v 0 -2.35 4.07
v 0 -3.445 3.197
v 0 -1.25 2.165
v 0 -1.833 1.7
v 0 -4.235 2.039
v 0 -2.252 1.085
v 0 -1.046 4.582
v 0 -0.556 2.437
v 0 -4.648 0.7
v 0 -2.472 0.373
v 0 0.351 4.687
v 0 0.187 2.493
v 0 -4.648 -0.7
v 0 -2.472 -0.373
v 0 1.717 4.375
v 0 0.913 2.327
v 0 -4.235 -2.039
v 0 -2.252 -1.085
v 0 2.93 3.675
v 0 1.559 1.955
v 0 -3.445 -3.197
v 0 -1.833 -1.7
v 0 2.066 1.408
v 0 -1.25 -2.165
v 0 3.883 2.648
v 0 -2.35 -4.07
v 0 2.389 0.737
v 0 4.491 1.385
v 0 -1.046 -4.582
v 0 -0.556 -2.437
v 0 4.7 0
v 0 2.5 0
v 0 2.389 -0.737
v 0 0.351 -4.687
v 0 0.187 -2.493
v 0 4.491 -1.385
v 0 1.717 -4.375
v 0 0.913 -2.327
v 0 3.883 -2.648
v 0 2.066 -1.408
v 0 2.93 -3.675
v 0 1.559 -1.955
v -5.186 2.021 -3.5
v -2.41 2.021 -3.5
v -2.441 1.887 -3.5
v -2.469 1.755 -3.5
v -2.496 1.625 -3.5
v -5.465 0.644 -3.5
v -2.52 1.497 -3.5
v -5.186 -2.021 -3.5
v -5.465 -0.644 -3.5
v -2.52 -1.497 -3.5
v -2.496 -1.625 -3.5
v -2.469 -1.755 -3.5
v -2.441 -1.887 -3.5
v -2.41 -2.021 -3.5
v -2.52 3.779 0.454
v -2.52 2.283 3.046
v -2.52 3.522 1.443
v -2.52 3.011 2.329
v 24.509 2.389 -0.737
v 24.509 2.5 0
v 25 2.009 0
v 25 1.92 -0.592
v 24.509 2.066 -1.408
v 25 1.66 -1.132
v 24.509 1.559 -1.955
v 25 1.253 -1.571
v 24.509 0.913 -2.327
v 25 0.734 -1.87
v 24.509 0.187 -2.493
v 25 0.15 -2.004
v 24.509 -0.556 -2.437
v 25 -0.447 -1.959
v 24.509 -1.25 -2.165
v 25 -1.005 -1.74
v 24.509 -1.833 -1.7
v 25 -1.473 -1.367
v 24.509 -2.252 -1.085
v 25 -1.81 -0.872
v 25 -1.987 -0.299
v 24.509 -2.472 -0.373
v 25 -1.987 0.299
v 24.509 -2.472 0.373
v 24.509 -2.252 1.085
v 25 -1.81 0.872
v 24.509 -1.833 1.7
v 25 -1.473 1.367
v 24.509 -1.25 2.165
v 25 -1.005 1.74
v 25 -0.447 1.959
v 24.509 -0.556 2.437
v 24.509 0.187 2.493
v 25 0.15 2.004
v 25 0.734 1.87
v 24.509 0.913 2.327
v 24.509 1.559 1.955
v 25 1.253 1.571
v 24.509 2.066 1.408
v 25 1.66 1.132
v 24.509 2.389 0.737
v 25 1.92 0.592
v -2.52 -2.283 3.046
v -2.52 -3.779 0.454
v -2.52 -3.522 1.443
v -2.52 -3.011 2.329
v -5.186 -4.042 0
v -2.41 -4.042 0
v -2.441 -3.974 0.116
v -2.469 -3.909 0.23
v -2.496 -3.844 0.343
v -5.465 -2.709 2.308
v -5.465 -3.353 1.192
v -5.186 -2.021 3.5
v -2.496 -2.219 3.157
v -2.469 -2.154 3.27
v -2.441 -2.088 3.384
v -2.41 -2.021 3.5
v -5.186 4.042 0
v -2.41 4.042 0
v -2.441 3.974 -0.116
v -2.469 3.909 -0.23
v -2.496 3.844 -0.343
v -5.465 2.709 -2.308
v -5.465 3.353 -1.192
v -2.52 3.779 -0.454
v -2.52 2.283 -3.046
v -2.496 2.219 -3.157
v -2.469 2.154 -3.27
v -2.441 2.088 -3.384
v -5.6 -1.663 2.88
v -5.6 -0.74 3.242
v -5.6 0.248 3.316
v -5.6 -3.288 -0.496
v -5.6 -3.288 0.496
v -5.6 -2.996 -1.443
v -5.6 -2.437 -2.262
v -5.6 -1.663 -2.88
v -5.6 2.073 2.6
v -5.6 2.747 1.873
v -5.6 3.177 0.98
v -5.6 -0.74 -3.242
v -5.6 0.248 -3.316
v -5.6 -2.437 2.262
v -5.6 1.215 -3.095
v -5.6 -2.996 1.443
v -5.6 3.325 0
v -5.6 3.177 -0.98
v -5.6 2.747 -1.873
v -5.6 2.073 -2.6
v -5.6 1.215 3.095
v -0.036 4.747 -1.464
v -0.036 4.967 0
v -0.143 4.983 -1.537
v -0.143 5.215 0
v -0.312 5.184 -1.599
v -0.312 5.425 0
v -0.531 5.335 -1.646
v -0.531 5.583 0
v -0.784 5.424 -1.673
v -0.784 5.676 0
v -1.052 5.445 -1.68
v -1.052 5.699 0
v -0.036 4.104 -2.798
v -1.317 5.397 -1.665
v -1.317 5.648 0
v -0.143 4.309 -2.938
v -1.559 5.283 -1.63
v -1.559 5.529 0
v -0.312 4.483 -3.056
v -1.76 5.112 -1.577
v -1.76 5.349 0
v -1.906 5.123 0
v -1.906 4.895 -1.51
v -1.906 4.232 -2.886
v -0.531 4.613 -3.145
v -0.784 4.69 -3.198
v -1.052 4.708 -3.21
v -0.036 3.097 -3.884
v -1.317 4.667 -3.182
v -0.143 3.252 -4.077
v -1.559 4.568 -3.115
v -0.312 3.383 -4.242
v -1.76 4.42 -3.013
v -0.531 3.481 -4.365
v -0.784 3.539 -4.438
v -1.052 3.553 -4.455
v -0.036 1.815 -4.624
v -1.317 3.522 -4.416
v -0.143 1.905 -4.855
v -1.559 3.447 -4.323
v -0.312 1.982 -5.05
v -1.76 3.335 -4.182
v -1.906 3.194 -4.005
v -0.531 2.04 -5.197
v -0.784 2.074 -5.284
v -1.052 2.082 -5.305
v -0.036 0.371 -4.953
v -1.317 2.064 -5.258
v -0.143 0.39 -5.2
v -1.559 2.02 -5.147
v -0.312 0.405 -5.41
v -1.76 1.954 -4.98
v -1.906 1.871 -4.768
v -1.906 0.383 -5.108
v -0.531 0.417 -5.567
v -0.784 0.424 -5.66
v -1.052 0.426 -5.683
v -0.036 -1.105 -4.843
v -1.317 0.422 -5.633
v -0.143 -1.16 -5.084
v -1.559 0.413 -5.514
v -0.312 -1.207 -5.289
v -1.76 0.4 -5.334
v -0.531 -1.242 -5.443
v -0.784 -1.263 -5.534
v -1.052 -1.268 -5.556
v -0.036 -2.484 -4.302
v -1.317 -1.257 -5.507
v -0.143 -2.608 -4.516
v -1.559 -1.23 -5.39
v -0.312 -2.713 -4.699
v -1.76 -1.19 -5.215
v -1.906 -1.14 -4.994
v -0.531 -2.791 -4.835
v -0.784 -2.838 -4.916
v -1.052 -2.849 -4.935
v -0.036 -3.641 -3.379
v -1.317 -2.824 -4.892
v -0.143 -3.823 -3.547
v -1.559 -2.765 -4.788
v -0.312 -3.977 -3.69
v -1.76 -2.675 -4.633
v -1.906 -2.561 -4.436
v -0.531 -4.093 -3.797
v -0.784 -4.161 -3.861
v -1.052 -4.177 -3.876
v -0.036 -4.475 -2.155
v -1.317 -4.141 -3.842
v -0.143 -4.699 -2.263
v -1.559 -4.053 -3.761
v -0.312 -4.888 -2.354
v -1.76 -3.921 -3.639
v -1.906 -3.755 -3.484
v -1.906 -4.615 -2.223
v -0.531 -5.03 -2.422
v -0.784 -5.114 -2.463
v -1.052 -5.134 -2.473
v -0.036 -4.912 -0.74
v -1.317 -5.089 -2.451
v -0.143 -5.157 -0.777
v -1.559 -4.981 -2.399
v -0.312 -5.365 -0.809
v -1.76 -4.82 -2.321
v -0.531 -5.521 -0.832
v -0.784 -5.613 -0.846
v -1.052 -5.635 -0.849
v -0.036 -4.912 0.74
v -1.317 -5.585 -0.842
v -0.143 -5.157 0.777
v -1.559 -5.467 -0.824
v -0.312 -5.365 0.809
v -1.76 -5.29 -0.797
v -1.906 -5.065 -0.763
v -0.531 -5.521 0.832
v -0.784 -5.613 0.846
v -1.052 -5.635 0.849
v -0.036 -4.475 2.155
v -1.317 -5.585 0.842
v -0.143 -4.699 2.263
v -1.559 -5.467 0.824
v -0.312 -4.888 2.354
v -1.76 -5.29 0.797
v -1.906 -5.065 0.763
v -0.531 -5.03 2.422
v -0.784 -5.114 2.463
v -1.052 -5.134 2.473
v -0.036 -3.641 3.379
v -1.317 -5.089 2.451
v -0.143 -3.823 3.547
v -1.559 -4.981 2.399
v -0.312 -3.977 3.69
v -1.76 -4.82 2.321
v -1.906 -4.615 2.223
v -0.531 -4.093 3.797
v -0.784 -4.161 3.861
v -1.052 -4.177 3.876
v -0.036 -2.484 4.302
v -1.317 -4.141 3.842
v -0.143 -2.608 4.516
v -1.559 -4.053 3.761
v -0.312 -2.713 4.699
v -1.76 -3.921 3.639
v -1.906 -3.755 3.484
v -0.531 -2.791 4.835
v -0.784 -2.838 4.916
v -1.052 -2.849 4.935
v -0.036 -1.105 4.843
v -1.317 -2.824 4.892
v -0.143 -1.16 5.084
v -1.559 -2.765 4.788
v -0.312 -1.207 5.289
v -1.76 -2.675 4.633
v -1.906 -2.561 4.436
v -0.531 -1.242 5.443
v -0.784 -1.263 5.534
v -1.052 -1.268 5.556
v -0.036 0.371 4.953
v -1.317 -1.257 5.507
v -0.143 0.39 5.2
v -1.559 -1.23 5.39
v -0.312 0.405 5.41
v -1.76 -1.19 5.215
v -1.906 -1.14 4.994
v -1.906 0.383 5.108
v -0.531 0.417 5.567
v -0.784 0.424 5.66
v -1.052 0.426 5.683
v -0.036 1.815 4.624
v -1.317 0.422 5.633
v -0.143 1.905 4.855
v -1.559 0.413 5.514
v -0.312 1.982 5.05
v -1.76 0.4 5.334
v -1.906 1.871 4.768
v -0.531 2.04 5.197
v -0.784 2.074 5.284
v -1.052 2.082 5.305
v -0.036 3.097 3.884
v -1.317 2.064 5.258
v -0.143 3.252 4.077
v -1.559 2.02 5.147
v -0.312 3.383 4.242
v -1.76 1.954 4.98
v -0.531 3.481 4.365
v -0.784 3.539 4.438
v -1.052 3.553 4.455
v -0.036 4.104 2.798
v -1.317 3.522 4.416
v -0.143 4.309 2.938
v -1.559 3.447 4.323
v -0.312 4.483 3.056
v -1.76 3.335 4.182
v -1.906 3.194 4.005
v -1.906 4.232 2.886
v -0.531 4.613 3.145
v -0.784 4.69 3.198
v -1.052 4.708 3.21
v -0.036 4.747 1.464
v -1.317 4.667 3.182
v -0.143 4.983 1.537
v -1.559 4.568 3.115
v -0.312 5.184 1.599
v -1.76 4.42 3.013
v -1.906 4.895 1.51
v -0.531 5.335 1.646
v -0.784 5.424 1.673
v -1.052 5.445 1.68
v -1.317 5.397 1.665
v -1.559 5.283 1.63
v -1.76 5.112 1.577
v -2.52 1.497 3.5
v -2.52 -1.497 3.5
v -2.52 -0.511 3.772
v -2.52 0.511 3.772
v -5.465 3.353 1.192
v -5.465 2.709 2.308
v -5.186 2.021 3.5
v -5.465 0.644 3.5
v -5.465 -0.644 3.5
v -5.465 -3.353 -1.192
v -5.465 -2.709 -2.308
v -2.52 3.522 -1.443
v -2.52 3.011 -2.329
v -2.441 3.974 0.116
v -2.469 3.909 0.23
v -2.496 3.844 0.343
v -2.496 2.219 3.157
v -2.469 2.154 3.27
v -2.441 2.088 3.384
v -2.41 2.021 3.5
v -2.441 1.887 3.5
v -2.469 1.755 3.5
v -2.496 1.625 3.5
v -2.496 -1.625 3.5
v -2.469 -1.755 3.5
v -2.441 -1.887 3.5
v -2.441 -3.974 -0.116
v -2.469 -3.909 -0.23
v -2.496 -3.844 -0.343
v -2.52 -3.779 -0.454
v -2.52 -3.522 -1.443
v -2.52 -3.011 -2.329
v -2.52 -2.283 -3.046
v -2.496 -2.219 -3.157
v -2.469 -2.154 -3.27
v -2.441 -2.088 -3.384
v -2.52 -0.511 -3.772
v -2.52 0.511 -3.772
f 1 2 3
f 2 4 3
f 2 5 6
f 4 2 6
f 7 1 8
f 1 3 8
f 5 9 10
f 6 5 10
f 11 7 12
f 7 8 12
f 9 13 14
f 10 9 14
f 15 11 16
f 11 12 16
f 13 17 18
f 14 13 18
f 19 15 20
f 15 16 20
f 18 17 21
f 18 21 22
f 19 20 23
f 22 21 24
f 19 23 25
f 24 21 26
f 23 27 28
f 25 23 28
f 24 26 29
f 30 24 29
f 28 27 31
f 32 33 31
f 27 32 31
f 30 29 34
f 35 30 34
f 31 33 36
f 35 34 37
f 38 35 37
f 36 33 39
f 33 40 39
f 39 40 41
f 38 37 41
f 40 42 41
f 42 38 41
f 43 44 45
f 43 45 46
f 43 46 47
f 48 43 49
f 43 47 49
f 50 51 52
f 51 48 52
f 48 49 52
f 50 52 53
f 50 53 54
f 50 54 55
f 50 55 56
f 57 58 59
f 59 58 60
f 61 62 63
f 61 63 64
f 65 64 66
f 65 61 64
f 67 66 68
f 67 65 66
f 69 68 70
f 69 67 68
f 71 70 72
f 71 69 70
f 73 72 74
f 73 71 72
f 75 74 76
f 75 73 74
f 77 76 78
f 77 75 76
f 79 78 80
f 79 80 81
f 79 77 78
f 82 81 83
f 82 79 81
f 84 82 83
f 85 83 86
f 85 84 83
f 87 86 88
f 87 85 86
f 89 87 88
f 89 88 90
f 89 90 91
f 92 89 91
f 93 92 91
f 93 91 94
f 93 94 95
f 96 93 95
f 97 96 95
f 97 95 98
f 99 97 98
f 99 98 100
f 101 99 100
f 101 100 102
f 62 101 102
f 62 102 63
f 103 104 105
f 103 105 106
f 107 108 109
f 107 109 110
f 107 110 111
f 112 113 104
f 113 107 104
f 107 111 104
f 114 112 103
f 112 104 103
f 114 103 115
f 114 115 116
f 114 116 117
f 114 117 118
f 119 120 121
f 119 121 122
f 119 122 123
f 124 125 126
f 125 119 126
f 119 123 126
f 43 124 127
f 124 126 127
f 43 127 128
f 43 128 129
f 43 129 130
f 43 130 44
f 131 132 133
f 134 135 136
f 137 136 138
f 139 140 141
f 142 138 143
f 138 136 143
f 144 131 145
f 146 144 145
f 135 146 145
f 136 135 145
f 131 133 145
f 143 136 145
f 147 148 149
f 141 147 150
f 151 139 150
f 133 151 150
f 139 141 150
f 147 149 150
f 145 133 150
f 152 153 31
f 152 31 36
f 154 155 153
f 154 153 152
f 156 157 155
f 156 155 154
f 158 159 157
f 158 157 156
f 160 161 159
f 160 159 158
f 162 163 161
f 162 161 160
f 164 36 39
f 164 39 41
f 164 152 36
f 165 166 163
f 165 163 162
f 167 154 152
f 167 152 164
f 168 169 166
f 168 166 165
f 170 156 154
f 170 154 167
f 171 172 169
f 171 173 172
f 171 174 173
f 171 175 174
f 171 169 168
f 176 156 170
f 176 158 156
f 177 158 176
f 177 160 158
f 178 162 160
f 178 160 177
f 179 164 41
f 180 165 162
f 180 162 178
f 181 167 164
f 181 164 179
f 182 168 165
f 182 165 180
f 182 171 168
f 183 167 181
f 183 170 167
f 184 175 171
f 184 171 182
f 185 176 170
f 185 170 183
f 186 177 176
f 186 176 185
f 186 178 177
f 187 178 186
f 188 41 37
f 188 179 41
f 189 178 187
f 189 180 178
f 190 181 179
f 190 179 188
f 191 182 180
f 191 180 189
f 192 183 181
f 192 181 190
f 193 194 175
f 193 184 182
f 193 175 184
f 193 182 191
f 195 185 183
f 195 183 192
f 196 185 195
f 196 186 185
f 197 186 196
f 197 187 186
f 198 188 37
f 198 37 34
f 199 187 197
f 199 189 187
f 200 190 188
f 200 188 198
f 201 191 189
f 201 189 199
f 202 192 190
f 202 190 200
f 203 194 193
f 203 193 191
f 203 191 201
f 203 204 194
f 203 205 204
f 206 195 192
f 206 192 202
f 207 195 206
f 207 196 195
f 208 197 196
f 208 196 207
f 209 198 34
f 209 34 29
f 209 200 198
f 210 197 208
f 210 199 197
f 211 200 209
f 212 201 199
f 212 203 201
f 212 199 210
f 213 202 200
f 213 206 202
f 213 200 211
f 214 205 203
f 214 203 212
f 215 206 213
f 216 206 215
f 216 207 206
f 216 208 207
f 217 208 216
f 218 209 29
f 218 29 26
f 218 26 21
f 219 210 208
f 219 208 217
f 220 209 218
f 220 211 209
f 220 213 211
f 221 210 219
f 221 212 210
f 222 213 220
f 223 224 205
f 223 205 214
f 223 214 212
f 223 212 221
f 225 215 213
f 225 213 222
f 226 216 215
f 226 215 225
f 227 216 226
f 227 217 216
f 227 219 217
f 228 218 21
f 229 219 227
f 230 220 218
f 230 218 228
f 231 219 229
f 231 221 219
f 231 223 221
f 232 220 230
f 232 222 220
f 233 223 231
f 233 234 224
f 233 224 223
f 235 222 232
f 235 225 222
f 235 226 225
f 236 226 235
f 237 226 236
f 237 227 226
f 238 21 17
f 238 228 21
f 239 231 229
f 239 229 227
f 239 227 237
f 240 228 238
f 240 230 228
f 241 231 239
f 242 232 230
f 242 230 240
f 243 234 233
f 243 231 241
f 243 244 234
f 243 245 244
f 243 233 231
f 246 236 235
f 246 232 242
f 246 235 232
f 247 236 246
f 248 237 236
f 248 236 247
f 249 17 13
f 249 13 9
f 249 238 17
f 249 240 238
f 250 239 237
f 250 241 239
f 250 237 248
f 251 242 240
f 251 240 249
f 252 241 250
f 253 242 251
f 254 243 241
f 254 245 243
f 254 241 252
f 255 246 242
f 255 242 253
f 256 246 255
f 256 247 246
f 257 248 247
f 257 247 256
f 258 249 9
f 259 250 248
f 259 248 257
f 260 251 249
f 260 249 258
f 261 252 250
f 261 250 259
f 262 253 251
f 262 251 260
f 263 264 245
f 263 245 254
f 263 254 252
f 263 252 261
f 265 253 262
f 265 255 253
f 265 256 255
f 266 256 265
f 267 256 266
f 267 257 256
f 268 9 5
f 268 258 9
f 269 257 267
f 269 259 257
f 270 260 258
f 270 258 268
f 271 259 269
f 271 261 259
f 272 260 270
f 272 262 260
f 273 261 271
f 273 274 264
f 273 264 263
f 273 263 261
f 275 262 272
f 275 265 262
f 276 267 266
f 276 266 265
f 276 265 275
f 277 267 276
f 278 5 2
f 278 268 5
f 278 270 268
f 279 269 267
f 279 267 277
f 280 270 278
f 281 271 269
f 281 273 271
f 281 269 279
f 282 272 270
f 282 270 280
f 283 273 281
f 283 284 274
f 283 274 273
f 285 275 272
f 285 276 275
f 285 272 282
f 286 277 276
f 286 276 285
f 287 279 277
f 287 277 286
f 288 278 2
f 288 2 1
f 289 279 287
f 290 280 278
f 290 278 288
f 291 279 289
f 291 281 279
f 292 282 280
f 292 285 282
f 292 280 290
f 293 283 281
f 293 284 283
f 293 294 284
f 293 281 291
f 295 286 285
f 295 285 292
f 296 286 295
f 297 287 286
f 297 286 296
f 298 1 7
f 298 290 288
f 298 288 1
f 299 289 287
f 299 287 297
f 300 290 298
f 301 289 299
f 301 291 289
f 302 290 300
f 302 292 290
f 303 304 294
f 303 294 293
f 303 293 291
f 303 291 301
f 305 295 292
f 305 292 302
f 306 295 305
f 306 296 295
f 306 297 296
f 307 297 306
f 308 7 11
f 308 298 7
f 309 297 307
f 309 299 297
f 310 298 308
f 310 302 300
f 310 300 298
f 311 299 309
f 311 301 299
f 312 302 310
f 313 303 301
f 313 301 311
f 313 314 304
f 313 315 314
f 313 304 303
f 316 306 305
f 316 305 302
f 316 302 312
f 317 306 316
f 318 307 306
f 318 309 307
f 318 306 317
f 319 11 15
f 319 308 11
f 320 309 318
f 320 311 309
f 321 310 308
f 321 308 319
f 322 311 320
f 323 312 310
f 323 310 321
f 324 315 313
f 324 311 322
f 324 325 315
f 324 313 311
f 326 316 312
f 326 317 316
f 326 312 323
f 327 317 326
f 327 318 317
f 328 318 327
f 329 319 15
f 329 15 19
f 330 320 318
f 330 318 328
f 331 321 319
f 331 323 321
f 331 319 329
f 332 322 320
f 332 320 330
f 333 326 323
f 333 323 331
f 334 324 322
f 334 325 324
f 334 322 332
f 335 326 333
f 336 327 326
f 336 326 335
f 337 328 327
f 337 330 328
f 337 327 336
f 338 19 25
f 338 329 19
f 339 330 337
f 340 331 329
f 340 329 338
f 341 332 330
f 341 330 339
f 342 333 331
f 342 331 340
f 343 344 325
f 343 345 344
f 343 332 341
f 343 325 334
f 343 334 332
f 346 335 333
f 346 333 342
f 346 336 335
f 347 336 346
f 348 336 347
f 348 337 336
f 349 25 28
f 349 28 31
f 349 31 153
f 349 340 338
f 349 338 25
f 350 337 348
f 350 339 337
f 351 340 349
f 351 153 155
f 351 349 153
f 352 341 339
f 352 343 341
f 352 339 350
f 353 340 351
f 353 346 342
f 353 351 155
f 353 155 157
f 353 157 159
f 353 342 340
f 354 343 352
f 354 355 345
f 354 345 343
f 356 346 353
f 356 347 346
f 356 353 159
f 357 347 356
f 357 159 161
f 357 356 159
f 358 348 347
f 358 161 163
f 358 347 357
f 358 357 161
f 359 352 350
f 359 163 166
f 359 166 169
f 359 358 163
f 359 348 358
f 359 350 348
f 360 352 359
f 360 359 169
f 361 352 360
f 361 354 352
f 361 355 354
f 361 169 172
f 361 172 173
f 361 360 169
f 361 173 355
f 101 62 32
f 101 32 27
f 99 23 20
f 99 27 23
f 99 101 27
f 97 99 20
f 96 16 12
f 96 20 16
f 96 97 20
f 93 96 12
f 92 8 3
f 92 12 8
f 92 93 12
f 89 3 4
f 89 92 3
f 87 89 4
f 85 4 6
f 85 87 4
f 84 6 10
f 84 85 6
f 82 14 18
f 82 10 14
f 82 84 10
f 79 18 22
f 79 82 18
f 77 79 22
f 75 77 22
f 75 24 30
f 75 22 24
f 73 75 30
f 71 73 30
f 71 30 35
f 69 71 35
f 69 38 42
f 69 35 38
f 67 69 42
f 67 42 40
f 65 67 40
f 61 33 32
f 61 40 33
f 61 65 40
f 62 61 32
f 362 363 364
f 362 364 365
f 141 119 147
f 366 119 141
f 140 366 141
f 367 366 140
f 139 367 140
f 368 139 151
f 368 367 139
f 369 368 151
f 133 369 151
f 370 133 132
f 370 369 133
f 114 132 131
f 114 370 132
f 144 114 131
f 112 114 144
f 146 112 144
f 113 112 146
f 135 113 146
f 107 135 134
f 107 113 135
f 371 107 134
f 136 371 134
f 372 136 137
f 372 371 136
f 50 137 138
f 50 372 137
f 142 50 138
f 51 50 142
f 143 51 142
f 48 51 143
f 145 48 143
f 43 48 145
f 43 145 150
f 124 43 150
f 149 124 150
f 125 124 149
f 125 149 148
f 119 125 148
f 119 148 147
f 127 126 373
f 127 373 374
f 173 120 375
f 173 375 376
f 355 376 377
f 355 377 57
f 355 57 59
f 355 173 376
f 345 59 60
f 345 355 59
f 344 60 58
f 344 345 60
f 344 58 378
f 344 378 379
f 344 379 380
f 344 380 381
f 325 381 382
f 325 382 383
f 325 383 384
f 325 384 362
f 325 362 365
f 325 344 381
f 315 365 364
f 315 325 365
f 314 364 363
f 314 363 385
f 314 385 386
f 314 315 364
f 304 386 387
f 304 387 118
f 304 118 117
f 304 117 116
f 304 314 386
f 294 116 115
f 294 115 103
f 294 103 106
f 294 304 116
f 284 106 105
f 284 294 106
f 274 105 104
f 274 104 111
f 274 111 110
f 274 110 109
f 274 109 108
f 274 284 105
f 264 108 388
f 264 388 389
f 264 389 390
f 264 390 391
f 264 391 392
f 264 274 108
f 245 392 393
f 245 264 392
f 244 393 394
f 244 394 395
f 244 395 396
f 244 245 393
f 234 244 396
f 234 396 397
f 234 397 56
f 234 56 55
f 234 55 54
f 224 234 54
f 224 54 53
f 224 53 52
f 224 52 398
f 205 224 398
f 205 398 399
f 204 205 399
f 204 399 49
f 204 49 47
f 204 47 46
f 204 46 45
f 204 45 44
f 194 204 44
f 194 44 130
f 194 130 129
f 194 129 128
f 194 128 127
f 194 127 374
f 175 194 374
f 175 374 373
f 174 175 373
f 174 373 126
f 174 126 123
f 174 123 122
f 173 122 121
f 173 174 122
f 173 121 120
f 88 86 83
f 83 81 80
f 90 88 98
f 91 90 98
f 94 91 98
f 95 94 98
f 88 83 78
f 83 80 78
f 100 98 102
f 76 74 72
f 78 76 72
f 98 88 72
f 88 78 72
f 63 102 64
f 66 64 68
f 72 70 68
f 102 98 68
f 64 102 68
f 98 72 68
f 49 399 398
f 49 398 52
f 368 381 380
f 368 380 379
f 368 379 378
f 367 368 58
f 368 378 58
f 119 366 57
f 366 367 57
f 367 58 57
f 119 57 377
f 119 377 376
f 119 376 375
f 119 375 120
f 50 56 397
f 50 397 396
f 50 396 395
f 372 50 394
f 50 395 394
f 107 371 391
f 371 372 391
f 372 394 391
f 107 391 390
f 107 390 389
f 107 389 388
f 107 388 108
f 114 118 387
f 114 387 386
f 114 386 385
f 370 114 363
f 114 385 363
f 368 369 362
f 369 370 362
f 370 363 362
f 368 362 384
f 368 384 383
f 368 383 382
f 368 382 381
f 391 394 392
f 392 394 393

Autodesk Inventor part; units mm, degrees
ref_plane "YZ Plane" through (0, 0, 0) normal (1, 0, 0) x (0, 1, 0)
ref_plane "XZ Plane" through (0, 0, 0) normal (0, 1, 0) x (-1, 0, 0)
sketch "Sketch1" plane through (0, 0, 0) normal (0, 0, 1) x (1, 0, 0)
  line L0 (-2.52, 0) -> (-2.52, 3.8066)
  line L1 (0, 4.7) -> (0, 2.5)
  line L2 (9, 2.5) -> (25, 2.5)
  line L3 (25, 2.5) -> (25, 0)
  line L4 (25, 0) -> (-2.52, 0)
  arc A0 (0, 4.7) -> (-1.9063, 5.1226) centre (-1, 4.7) ccw
  line L5 (0, -1.1775) -> (0, 7.0651) projected
  line L6 (-8.024, 0) -> (30.504, 0) projected
  line L7 (0, 2.5) -> (0.0001, 2.5)
  line L8 (0.0001, 2.5) -> (0.0001, 2.5)
  line L9 (0.0001, 2.5) -> (8.5092, 2.5)
  line L10 (8.5092, 2.5) -> (9, 2.5)
  line L11 (-2.52, 3.8066) -> (-1.9063, 5.1226)
  line L12 (0.0001, 2.5) -> (9, 2.5) construction
  line L13 (9, 2.5) -> (9, 0) construction
  dimension "d0" = 1
  dimension "d1" = 25
  dimension "d2" = 16
  dimension "d3" = 11.4
  dimension "d4" = 5
  dimension "d5" = 2.52
  dimension "d15" = 5
  dimension "d16" = 5
  dimension "d17" = 0.0001
  dimension "d18" = 0.4908
  dimension "d19" = 25
revolve "Body" add sketch "Sketch1" angle 360 about axis through (25, 0, 0) along (-1, 0, 0)
sketch "Sketch2" plane through (0, 0, 0) normal (1, 0, 0) x (0, 0, -1)
  line L0 (3.5, 2.0207) -> (3.5, -2.0207)
  line L1 (3.5, -2.0207) -> (0, -4.0415)
  line L2 (0, -4.0415) -> (-3.5, -2.0207)
  line L3 (-3.5, -2.0207) -> (-3.5, 2.0207)
  line L4 (-3.5, 2.0207) -> (0, 4.0415)
  line L5 (0, 4.0415) -> (3.5, 2.0207)
  point P0 (0, 0)
  point P1 (0, 0)
  dimension "d23" = 7
extrude "Head" add sketch "Sketch2" against normal blind 5.6
sketch "Sketch3" plane through (0, 0, 0) normal (0, 0, 1) x (1, 0, 0)
  line L0 (-5.6, 3.325) -> (-5.6, 4.0415)
  line L1 (-5.6, 4.0415) -> (-5.1864, 4.0415)
  line L2 (-5.1864, 4.0415) -> (-5.6, 3.325)
  line L3 (-6.2379, 0) -> (-1.7726, 0) projected
  line L4 (-5.6, 4.0415) -> (-5.6, 2.0207) projected
  line L5 (-2.4105, 4.0415) -> (-5.6, 4.0415) projected
  point P0 (-5.6, 2.0207)
  dimension "d8" = 30
  dimension "d22" = 6.65
revolve "Chamfer1" cut sketch "Sketch3" angle 360 about axis through (-10, 0, 0) along (1, 0, 0)
thread "Thread" size "M5x0.8" class "6g" standard "ISO Metric profile" length 16
chamfer "Chamfer2" distance 0.4908 distance2 0.4908 1 edges at (25, -2.5, 0) measured on face at (25, 0.4734, 0.4194)
ref_plane "Work Plane1" through (10.95, 0, 0) normal (0, 0, -1) x (1, 0, 0)
equation "\"d23\" = SW"
equation "\"d6\" = KOH"
equation "\"d10\" = GEL"
equation "\"d13\" = -0.5 * SPD + 0.5 * GD"
equation "\"d14\" = GUL"
equation "\"d0\" = PHH"
equation "\"d1\" = NLG"
equation "\"d2\" = GEL"
equation "\"d3\" = LADI"
equation "\"d4\" = GD"
equation "\"d5\" = 0.45 * KOH"
equation "\"d15\" = SD2"
equation "\"d16\" = BDM"
equation "\"d18\" = GAL"
equation "\"d19\" = KEWI"
equation "\"d8\" = ANG1"
equation "\"d22\" = SW0"
equation "\"NLG\" = 25"
equation "\"GD\" = NND"
equation "\"BDM\" = NND"
equation "\"KOH\" = 5.6"
equation "\"GEL\" = 16"
equation "\"LADI\" = 11.4"
equation "\"SW\" = 7"
equation "\"PHH\" = RR"
equation "\"SW0\" = 6.65"
equation "\"SPD\" = NND - 1.2269 * PTC"
equation "\"SD2\" = NND"
equation "\"SD\" = 0"
equation "\"ANG1\" = 30deg"
equation "\"KEWI\" = 25deg"
equation "\"GAL\" = 0.61345 * PTC"
equation "\"GUL\" = 0.61345 * PTC"
equation "\"PTC\" = 0.8"
equation "\"THREADDIA\" = 5"
equation "\"E0\" = 1.155 * SW"
equation "\"TOA\" = 30deg"
equation "\"NND\" = 5"
equation "\"GD1\" = THREADDIA - 1.2269 * PTC"
equation "\"SDH\" = SW"
equation "\"KOH1\" = 2.3"
equation "\"RR\" = 1"
properties part number "ISO 4162 - M5 x 25" material "Stainless Steel"
